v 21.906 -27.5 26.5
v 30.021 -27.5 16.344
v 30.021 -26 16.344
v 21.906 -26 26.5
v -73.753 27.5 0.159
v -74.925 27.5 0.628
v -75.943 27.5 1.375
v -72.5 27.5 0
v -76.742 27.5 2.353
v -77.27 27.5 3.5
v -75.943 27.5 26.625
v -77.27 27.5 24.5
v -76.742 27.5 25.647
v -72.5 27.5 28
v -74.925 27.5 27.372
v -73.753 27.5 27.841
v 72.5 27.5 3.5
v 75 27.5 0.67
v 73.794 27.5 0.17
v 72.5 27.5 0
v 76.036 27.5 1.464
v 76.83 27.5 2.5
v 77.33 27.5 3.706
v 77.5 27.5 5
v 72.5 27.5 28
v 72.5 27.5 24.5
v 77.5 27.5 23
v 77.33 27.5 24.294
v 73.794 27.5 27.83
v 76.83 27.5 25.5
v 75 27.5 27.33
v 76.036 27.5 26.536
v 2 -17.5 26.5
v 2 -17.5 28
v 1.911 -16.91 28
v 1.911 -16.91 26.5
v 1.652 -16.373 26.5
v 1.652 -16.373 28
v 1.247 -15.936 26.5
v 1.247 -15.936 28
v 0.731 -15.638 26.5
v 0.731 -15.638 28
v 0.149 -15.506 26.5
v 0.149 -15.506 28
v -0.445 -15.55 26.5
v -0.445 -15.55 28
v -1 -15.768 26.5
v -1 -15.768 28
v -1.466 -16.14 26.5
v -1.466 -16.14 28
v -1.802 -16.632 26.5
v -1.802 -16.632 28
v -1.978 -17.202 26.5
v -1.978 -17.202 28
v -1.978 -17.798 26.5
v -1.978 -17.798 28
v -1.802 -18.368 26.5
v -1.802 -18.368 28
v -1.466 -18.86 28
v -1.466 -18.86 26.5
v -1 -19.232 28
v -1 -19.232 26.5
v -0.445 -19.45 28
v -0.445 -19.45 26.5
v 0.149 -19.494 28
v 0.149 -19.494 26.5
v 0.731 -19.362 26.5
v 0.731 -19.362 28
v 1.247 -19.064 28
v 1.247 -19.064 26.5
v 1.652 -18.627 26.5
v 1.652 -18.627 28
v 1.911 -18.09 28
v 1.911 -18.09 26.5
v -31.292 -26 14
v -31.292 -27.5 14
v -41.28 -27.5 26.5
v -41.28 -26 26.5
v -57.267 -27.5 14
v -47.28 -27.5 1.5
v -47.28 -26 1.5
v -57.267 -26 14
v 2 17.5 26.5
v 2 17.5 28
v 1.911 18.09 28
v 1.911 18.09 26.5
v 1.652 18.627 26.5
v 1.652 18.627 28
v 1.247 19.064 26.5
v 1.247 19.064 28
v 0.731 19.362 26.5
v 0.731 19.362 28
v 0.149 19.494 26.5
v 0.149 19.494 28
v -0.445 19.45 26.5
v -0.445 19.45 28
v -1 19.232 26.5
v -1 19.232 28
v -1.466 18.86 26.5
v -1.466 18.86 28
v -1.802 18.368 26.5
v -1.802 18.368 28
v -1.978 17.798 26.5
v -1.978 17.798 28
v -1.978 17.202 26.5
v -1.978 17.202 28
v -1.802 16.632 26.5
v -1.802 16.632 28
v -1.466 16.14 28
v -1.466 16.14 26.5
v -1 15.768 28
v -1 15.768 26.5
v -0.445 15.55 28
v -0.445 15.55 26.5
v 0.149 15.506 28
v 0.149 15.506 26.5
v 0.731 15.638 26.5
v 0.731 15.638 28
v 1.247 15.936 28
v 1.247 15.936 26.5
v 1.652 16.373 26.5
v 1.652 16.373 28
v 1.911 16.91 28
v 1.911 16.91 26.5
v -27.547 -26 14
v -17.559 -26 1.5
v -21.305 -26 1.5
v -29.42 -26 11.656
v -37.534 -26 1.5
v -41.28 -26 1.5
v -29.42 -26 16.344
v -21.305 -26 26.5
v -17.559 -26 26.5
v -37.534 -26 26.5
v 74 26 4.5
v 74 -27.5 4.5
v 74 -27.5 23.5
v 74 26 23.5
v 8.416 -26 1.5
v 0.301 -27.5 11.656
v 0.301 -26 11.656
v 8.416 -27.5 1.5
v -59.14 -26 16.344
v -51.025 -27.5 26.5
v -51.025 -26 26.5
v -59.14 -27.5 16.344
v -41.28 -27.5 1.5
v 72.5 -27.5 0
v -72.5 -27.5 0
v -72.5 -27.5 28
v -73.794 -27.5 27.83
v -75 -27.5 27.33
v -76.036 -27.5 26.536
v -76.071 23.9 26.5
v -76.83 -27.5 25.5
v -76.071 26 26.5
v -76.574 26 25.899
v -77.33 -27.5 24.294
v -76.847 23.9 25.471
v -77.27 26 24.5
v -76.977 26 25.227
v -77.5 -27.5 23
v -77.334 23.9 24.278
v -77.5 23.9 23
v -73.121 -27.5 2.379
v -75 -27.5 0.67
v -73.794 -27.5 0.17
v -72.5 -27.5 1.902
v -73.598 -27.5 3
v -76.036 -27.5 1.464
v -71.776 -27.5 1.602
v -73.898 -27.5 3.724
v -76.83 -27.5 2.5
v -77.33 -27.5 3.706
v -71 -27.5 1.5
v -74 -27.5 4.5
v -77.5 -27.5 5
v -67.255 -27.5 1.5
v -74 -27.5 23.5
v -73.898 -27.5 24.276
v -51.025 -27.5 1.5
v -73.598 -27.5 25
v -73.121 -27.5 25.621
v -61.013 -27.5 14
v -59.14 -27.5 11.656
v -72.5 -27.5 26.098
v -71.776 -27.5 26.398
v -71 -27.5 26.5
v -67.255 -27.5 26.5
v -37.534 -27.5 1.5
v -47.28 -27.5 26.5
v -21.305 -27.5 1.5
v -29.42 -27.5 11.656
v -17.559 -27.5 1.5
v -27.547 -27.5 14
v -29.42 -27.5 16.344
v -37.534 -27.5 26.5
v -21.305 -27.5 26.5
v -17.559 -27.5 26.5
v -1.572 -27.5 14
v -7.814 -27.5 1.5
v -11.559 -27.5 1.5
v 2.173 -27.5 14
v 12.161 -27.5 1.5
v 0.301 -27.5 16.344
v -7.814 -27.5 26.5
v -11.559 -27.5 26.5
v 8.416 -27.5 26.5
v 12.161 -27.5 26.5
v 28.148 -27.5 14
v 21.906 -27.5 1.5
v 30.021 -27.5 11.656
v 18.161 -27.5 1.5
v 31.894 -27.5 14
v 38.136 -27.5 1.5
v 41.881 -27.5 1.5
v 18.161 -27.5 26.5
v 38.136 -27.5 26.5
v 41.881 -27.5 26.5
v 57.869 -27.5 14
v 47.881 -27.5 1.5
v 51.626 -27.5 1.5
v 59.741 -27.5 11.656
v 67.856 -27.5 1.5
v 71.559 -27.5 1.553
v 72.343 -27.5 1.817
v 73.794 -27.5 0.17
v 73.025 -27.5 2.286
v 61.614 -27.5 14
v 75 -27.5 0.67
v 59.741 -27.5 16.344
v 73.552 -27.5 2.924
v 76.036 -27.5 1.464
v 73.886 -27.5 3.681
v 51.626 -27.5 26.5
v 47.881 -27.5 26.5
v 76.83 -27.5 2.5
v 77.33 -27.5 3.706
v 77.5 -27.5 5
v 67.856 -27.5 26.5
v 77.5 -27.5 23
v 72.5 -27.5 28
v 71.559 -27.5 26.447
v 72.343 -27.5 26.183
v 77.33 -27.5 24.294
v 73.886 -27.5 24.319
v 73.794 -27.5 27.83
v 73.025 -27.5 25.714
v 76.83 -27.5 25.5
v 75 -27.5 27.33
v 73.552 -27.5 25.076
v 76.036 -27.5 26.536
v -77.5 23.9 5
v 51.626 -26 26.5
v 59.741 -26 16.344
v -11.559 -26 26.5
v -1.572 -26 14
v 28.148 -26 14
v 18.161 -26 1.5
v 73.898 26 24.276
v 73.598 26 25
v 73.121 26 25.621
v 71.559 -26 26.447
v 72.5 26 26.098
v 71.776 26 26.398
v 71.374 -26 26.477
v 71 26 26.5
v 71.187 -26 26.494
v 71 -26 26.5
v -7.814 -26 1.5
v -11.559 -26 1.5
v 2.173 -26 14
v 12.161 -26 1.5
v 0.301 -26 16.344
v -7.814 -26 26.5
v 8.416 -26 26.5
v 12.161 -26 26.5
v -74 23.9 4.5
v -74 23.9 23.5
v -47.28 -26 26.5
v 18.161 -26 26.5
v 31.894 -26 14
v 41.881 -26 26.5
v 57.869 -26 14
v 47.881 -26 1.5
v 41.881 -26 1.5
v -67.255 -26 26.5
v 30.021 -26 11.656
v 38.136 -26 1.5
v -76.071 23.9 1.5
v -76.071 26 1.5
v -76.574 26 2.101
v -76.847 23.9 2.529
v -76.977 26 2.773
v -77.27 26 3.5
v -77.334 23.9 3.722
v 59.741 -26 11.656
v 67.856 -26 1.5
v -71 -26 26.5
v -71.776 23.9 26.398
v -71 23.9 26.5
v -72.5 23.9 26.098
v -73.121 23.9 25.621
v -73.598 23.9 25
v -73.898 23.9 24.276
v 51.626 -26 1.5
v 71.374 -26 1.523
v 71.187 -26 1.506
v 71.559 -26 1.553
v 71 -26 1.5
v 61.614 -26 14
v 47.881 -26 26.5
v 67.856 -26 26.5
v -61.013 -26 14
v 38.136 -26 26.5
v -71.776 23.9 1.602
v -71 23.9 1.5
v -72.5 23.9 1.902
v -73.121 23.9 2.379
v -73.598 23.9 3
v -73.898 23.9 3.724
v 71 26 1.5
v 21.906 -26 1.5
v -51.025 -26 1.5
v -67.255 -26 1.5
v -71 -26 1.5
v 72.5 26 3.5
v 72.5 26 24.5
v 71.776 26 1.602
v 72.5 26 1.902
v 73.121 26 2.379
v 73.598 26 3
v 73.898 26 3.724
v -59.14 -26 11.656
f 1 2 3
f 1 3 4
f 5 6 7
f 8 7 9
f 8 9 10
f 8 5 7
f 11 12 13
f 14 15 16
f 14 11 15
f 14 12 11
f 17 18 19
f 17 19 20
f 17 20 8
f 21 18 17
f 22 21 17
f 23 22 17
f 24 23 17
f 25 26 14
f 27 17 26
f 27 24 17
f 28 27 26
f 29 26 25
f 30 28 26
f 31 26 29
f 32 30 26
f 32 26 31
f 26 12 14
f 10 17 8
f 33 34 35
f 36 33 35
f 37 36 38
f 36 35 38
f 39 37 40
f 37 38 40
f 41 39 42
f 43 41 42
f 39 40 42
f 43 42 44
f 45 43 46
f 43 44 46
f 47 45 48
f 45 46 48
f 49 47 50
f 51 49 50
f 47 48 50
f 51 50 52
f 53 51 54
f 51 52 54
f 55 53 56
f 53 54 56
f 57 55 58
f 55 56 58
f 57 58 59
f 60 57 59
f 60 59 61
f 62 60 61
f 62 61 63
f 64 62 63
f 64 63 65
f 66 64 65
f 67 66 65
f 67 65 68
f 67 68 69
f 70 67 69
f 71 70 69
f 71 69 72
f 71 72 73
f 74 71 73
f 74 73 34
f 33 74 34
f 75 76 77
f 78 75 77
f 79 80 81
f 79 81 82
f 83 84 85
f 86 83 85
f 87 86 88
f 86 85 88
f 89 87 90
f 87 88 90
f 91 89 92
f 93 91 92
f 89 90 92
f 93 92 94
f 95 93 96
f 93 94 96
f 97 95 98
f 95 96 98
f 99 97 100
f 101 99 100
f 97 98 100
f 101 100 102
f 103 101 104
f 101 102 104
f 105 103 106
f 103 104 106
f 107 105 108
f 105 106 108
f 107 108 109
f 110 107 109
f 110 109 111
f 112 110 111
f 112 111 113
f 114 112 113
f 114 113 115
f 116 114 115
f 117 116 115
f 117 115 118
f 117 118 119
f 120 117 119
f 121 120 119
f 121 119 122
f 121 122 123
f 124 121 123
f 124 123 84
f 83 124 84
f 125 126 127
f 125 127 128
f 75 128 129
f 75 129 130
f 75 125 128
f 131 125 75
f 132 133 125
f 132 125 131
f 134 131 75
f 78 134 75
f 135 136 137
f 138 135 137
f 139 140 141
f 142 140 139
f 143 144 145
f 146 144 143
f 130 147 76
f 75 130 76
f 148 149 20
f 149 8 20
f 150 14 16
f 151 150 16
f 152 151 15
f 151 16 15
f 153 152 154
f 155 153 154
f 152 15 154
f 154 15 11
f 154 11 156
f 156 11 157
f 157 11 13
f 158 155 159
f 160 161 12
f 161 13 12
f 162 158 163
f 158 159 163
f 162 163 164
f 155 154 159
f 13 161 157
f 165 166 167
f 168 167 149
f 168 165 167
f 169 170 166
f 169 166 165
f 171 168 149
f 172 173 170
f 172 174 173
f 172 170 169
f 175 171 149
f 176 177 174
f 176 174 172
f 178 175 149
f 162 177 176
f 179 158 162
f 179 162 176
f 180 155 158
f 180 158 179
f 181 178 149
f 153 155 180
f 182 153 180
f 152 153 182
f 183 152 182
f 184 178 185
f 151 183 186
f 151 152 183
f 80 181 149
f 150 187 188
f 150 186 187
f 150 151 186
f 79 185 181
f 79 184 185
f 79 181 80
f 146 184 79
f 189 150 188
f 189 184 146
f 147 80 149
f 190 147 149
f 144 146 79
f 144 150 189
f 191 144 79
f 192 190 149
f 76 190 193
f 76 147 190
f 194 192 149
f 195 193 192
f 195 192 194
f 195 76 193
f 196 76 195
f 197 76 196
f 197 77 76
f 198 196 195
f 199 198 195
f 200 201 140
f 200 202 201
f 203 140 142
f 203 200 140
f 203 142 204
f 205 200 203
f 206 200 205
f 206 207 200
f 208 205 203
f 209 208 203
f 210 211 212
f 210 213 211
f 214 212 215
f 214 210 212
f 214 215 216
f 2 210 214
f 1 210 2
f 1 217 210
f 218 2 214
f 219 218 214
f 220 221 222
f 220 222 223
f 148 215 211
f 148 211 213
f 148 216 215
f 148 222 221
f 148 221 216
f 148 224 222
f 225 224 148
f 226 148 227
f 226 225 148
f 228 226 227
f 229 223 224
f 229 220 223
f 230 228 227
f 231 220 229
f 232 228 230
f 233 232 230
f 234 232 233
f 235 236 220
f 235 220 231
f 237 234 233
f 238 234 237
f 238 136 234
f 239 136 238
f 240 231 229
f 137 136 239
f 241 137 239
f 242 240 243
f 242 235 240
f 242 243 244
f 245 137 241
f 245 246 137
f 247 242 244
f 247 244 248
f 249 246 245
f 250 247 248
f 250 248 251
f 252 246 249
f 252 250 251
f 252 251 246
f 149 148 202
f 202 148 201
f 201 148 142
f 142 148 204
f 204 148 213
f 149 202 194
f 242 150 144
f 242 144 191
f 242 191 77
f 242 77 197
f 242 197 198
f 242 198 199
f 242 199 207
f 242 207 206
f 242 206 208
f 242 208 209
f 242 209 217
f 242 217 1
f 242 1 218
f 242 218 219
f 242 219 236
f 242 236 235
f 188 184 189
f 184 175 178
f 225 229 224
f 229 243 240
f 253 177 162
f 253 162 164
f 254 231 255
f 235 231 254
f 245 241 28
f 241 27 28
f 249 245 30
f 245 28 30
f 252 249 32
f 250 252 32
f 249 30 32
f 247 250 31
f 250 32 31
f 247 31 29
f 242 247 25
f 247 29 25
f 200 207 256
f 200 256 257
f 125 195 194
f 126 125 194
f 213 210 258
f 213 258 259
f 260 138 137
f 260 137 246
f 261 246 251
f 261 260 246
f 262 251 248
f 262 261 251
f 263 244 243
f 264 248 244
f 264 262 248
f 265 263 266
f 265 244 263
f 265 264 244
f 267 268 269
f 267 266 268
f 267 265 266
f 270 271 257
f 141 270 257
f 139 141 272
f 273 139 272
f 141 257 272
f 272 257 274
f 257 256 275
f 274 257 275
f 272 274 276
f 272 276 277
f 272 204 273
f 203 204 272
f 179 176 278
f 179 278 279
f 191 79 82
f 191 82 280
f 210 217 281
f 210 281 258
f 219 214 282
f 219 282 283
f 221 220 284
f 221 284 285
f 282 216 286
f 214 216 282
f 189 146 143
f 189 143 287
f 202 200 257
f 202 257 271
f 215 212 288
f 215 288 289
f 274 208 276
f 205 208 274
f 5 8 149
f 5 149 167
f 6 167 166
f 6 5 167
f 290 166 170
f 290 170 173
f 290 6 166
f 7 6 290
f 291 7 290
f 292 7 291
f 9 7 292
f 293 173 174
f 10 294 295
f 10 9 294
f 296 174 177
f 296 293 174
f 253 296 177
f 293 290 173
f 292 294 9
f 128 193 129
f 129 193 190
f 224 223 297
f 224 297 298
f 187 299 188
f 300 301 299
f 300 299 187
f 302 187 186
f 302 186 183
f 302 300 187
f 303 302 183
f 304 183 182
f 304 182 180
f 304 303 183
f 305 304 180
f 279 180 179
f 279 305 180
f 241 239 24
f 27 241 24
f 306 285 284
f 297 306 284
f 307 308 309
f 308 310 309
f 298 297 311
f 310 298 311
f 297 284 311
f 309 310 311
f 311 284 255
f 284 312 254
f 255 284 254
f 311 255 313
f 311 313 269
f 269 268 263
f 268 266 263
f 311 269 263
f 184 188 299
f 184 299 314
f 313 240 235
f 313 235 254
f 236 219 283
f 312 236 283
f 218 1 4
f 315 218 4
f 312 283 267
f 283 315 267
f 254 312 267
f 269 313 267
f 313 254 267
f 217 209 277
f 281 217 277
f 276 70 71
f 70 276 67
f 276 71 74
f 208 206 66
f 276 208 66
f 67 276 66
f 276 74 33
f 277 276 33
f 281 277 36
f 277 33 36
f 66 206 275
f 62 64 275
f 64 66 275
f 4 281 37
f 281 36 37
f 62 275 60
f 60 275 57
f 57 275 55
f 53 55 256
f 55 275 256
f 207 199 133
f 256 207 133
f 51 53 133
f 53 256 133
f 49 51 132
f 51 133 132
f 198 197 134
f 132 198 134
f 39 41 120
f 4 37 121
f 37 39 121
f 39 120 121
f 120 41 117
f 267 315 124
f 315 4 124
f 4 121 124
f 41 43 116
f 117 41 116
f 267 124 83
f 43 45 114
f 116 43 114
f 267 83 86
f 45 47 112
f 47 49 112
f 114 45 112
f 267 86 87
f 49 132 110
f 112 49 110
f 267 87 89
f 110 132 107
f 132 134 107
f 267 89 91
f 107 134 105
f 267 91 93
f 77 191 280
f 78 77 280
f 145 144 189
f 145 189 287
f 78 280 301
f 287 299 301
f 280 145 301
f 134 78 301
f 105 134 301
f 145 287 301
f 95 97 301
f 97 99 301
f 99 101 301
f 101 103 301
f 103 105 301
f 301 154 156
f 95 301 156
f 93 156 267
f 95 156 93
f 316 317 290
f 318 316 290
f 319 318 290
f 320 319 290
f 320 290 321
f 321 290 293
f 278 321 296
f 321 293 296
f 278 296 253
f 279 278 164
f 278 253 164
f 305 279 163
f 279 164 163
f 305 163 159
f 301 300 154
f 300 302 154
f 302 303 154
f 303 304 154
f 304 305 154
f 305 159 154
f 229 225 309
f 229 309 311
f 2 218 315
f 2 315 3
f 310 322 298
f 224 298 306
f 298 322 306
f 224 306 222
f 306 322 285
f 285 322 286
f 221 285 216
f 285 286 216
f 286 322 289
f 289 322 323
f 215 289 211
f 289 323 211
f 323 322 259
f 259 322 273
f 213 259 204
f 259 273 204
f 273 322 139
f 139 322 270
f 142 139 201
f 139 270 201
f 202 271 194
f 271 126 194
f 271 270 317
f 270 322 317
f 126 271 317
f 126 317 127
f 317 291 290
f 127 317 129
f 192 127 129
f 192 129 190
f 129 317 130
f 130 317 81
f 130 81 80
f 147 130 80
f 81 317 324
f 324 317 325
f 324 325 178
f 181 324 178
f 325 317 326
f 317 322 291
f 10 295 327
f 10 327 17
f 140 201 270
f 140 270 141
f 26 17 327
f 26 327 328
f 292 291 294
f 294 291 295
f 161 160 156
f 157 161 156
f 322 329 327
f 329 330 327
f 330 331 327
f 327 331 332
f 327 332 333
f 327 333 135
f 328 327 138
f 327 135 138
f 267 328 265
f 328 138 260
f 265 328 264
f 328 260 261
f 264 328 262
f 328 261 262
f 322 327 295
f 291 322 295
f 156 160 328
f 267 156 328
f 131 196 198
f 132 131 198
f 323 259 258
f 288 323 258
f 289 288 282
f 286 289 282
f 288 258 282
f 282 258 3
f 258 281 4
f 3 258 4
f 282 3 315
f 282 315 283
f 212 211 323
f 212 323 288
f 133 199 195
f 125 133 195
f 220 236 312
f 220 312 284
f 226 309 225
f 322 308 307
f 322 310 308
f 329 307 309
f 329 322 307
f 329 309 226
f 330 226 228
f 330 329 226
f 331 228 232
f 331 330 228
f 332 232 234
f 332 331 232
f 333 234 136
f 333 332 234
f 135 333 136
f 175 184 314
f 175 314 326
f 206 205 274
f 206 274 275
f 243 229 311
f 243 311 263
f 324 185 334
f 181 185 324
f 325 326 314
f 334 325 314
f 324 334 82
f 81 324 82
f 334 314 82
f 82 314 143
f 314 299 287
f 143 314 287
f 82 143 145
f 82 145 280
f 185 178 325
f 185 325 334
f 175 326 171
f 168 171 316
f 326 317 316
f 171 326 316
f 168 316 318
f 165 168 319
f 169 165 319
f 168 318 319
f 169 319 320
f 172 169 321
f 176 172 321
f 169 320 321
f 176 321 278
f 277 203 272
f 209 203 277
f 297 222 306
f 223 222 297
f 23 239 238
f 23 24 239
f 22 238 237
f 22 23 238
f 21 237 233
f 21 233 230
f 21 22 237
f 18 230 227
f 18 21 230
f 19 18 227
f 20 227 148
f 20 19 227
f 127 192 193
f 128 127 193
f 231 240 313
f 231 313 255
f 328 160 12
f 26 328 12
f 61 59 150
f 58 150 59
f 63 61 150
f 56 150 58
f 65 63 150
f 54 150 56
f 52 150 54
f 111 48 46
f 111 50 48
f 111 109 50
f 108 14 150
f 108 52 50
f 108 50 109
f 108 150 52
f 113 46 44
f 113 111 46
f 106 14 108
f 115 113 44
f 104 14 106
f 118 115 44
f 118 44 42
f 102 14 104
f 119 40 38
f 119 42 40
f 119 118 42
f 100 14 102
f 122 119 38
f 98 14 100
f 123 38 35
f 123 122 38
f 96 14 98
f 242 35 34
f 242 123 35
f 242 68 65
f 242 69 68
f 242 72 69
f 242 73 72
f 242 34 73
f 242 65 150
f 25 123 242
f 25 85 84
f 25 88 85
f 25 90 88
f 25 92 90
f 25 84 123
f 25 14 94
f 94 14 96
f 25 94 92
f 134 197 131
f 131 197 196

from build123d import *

# Parameters (mm, degrees)
ESBO_O1_W                = 155
ESBO_O1_H                = 55
RESSALTO_EXTRUS_O1_DEPTH = 28
ESBO_O3_W                = 148
ESBO_O3_H                = 25
CORTE_EXTRUS_O1_DEPTH    = 100.071943556
CORTE_EXTRUS_O2_REACH    = 161.891
RESSALTO_EXTRUS_O2_REACH = 158.501
ESBO_O6_W                = 2
ESBO_O6_H                = 1.5
RESSALTO_EXTRUS_O3_REACH = 158.501
ESBO_O7_W                = 2
ESBO_O7_H                = 1.5
ESBO_O9_W                = 21
ESBO_O9_H                = 1.5
RESSALTO_EXTRUS_O4_DEPTH = 1.5
FILETE1_R                = 5
FILETE2_R                = 3
RESSALTO_EXTRUS_O5_DEPTH = 1.5
CORTE_EXTRUS_O5_REACH    = 88.871
ESBO_O15_R               = 2


with BuildPart() as part:
    # Esboço1 → Ressalto-extrusão1 (new body)
    with BuildSketch(Plane.XY):
        Rectangle(ESBO_O1_W, ESBO_O1_H)
    extrude(amount=RESSALTO_EXTRUS_O1_DEPTH)

    # Esboço3 → Corte-extrusão1 (cut, through all)
    with BuildSketch(Plane.XZ.offset(27.5)):
        with Locations((0, 14)):
            Rectangle(ESBO_O3_W, ESBO_O3_H)
    extrude(amount=-CORTE_EXTRUS_O1_DEPTH, mode=Mode.SUBTRACT)

    # Esboço4 → Corte-extrusão2 (cut, up to next)
    with BuildSketch(Plane.ZY.offset(77.5), mode=Mode.PRIVATE) as corte_extrus_o2_sk1:
        Polygon((3.5, 27.5), (3.5, 26), (1.5, 26), (1.5, 23.9), (26.5, 23.9), (26.5, 26), (24.5, 26), (24.5, 27.5), align=None)
    corte_extrus_o2_tool1 = extrude(corte_extrus_o2_sk1.sketch, amount=-CORTE_EXTRUS_O2_REACH, mode=Mode.PRIVATE) & part.part
    add(corte_extrus_o2_tool1.solids().sort_by_distance((-77.5, 25.625, 14))[0], mode=Mode.SUBTRACT)

    # Esboço6 → Ressalto-extrusão2 (add, up to next)
    with BuildSketch(Plane(origin=(-74, 0, 0), x_dir=(0, 0, -1), z_dir=(1, 0, 0)), mode=Mode.PRIVATE) as ressalto_extrus_o2_sk1:
        with Locations((-2.5, 26.75)):
            Rectangle(ESBO_O6_W, ESBO_O6_H)
    ressalto_extrus_o2_tool1 = extrude(ressalto_extrus_o2_sk1.sketch, amount=RESSALTO_EXTRUS_O2_REACH, mode=Mode.PRIVATE) - part.part
    add(ressalto_extrus_o2_tool1.solids().sort_by_distance((-74, 26.75, 2.5))[0])

    # Esboço7 → Ressalto-extrusão3 (add, up to next)
    with BuildSketch(Plane(origin=(-74, 0, 0), x_dir=(0, 0, -1), z_dir=(1, 0, 0)), mode=Mode.PRIVATE) as ressalto_extrus_o3_sk1:
        with Locations((-25.5, 26.75)):
            Rectangle(ESBO_O7_W, ESBO_O7_H)
    ressalto_extrus_o3_tool1 = extrude(ressalto_extrus_o3_sk1.sketch, amount=RESSALTO_EXTRUS_O3_REACH, mode=Mode.PRIVATE) - part.part
    add(ressalto_extrus_o3_tool1.solids().sort_by_distance((-74, 26.75, 25.5))[0])

    # Esboço9 → Ressalto-extrusão4 (add)
    with BuildSketch(Plane.ZY.offset(-74)):
        with Locations((14, 26.75)):
            Rectangle(ESBO_O9_W, ESBO_O9_H)
    extrude(amount=RESSALTO_EXTRUS_O4_DEPTH)

    # Filete1
    filete1_edges = [part.edges().sort_by_distance(p)[0] for p in [
        (-77.5, 0, 28),
        (-77.5, 0, 0),
        (77.5, 0, 0),
        (77.5, 0, 28),
    ]]
    fillet(filete1_edges, radius=FILETE1_R)

    # Filete2
    filete2_edges = [part.edges().sort_by_distance(p)[0] for p in [
        (-74, -1.8, 26.5),
        (-74, -1.8, 1.5),
        (74, -0.75, 1.5),
        (74, -0.75, 26.5),
    ]]
    fillet(filete2_edges, radius=FILETE2_R)

    # Esboço12 → Ressalto-extrusão5 (add)
    with BuildSketch(Plane.XZ.offset(27.5)):
        Polygon((-21.304721722, 26.5), (-17.559412156, 26.5), (-27.546904334, 14), (-17.559412156, 1.5), (-21.304721722, 1.5), (-29.419559117, 11.65625), (-37.534396511, 1.5), (-41.279706078, 1.5), (-31.2922139, 14), (-41.279706078, 26.5), (-37.534396511, 26.5), (-29.419559117, 16.34375), align=None)
        Polygon((-71, 26.5), (-61.012507822, 14), (-71, 1.5), (-67.254690433, 1.5), (-59.139853039, 11.65625), (-51.025015645, 1.5), (-47.279706078, 1.5), (-57.267198256, 14), (-47.279706078, 26.5), (-51.025015645, 26.5), (-59.139853039, 16.34375), (-67.254690433, 26.5), align=None)
        Polygon((0.300734805, 16.34375), (-7.814102589, 26.5), (-11.559412156, 26.5), (-1.571919978, 14), (-11.559412156, 1.5), (-7.814102589, 1.5), (0.300734805, 11.65625), (8.4155722, 1.5), (12.160881766, 1.5), (2.173389589, 14), (12.160881766, 26.5), (8.4155722, 26.5), align=None)
        Polygon((30.021028727, 16.34375), (21.906191333, 26.5), (18.160881766, 26.5), (28.148373944, 14), (18.160881766, 1.5), (21.906191333, 1.5), (30.021028727, 11.65625), (38.135866122, 1.5), (41.881175688, 1.5), (31.893683511, 14), (41.881175688, 26.5), (38.135866122, 26.5), align=None)
        Polygon((59.741322649, 16.34375), (51.626485255, 26.5), (47.881175688, 26.5), (57.868667866, 14), (47.881175688, 1.5), (51.626485255, 1.5), (59.741322649, 11.65625), (67.856160044, 1.5), (71.60146961, 1.5), (61.613977433, 14), (71.60146961, 26.5), (67.856160044, 26.5), align=None)
    extrude(amount=-RESSALTO_EXTRUS_O5_DEPTH)

    # Esboço15 → Corte-extrusão5 (cut, up to next)
    with BuildSketch(Plane.XY.offset(28), mode=Mode.PRIVATE) as corte_extrus_o5_sk1:
        with Locations((0, 17.5)):
            Circle(ESBO_O15_R)
    corte_extrus_o5_tool1 = extrude(corte_extrus_o5_sk1.sketch, amount=-CORTE_EXTRUS_O5_REACH, mode=Mode.PRIVATE) & part.part
    # Esboço15 → Corte-extrusão5 (cut, up to next)
    with BuildSketch(Plane.XY.offset(28), mode=Mode.PRIVATE) as corte_extrus_o5_sk2:
        with Locations((0, -17.5)):
            Circle(ESBO_O15_R)
    corte_extrus_o5_tool2 = extrude(corte_extrus_o5_sk2.sketch, amount=-CORTE_EXTRUS_O5_REACH, mode=Mode.PRIVATE) & part.part
    add(corte_extrus_o5_tool1.solids().sort_by_distance((0, 17.5, 28))[0], mode=Mode.SUBTRACT)
    add(corte_extrus_o5_tool2.solids().sort_by_distance((0, -17.5, 28))[0], mode=Mode.SUBTRACT)


solid = part.part
